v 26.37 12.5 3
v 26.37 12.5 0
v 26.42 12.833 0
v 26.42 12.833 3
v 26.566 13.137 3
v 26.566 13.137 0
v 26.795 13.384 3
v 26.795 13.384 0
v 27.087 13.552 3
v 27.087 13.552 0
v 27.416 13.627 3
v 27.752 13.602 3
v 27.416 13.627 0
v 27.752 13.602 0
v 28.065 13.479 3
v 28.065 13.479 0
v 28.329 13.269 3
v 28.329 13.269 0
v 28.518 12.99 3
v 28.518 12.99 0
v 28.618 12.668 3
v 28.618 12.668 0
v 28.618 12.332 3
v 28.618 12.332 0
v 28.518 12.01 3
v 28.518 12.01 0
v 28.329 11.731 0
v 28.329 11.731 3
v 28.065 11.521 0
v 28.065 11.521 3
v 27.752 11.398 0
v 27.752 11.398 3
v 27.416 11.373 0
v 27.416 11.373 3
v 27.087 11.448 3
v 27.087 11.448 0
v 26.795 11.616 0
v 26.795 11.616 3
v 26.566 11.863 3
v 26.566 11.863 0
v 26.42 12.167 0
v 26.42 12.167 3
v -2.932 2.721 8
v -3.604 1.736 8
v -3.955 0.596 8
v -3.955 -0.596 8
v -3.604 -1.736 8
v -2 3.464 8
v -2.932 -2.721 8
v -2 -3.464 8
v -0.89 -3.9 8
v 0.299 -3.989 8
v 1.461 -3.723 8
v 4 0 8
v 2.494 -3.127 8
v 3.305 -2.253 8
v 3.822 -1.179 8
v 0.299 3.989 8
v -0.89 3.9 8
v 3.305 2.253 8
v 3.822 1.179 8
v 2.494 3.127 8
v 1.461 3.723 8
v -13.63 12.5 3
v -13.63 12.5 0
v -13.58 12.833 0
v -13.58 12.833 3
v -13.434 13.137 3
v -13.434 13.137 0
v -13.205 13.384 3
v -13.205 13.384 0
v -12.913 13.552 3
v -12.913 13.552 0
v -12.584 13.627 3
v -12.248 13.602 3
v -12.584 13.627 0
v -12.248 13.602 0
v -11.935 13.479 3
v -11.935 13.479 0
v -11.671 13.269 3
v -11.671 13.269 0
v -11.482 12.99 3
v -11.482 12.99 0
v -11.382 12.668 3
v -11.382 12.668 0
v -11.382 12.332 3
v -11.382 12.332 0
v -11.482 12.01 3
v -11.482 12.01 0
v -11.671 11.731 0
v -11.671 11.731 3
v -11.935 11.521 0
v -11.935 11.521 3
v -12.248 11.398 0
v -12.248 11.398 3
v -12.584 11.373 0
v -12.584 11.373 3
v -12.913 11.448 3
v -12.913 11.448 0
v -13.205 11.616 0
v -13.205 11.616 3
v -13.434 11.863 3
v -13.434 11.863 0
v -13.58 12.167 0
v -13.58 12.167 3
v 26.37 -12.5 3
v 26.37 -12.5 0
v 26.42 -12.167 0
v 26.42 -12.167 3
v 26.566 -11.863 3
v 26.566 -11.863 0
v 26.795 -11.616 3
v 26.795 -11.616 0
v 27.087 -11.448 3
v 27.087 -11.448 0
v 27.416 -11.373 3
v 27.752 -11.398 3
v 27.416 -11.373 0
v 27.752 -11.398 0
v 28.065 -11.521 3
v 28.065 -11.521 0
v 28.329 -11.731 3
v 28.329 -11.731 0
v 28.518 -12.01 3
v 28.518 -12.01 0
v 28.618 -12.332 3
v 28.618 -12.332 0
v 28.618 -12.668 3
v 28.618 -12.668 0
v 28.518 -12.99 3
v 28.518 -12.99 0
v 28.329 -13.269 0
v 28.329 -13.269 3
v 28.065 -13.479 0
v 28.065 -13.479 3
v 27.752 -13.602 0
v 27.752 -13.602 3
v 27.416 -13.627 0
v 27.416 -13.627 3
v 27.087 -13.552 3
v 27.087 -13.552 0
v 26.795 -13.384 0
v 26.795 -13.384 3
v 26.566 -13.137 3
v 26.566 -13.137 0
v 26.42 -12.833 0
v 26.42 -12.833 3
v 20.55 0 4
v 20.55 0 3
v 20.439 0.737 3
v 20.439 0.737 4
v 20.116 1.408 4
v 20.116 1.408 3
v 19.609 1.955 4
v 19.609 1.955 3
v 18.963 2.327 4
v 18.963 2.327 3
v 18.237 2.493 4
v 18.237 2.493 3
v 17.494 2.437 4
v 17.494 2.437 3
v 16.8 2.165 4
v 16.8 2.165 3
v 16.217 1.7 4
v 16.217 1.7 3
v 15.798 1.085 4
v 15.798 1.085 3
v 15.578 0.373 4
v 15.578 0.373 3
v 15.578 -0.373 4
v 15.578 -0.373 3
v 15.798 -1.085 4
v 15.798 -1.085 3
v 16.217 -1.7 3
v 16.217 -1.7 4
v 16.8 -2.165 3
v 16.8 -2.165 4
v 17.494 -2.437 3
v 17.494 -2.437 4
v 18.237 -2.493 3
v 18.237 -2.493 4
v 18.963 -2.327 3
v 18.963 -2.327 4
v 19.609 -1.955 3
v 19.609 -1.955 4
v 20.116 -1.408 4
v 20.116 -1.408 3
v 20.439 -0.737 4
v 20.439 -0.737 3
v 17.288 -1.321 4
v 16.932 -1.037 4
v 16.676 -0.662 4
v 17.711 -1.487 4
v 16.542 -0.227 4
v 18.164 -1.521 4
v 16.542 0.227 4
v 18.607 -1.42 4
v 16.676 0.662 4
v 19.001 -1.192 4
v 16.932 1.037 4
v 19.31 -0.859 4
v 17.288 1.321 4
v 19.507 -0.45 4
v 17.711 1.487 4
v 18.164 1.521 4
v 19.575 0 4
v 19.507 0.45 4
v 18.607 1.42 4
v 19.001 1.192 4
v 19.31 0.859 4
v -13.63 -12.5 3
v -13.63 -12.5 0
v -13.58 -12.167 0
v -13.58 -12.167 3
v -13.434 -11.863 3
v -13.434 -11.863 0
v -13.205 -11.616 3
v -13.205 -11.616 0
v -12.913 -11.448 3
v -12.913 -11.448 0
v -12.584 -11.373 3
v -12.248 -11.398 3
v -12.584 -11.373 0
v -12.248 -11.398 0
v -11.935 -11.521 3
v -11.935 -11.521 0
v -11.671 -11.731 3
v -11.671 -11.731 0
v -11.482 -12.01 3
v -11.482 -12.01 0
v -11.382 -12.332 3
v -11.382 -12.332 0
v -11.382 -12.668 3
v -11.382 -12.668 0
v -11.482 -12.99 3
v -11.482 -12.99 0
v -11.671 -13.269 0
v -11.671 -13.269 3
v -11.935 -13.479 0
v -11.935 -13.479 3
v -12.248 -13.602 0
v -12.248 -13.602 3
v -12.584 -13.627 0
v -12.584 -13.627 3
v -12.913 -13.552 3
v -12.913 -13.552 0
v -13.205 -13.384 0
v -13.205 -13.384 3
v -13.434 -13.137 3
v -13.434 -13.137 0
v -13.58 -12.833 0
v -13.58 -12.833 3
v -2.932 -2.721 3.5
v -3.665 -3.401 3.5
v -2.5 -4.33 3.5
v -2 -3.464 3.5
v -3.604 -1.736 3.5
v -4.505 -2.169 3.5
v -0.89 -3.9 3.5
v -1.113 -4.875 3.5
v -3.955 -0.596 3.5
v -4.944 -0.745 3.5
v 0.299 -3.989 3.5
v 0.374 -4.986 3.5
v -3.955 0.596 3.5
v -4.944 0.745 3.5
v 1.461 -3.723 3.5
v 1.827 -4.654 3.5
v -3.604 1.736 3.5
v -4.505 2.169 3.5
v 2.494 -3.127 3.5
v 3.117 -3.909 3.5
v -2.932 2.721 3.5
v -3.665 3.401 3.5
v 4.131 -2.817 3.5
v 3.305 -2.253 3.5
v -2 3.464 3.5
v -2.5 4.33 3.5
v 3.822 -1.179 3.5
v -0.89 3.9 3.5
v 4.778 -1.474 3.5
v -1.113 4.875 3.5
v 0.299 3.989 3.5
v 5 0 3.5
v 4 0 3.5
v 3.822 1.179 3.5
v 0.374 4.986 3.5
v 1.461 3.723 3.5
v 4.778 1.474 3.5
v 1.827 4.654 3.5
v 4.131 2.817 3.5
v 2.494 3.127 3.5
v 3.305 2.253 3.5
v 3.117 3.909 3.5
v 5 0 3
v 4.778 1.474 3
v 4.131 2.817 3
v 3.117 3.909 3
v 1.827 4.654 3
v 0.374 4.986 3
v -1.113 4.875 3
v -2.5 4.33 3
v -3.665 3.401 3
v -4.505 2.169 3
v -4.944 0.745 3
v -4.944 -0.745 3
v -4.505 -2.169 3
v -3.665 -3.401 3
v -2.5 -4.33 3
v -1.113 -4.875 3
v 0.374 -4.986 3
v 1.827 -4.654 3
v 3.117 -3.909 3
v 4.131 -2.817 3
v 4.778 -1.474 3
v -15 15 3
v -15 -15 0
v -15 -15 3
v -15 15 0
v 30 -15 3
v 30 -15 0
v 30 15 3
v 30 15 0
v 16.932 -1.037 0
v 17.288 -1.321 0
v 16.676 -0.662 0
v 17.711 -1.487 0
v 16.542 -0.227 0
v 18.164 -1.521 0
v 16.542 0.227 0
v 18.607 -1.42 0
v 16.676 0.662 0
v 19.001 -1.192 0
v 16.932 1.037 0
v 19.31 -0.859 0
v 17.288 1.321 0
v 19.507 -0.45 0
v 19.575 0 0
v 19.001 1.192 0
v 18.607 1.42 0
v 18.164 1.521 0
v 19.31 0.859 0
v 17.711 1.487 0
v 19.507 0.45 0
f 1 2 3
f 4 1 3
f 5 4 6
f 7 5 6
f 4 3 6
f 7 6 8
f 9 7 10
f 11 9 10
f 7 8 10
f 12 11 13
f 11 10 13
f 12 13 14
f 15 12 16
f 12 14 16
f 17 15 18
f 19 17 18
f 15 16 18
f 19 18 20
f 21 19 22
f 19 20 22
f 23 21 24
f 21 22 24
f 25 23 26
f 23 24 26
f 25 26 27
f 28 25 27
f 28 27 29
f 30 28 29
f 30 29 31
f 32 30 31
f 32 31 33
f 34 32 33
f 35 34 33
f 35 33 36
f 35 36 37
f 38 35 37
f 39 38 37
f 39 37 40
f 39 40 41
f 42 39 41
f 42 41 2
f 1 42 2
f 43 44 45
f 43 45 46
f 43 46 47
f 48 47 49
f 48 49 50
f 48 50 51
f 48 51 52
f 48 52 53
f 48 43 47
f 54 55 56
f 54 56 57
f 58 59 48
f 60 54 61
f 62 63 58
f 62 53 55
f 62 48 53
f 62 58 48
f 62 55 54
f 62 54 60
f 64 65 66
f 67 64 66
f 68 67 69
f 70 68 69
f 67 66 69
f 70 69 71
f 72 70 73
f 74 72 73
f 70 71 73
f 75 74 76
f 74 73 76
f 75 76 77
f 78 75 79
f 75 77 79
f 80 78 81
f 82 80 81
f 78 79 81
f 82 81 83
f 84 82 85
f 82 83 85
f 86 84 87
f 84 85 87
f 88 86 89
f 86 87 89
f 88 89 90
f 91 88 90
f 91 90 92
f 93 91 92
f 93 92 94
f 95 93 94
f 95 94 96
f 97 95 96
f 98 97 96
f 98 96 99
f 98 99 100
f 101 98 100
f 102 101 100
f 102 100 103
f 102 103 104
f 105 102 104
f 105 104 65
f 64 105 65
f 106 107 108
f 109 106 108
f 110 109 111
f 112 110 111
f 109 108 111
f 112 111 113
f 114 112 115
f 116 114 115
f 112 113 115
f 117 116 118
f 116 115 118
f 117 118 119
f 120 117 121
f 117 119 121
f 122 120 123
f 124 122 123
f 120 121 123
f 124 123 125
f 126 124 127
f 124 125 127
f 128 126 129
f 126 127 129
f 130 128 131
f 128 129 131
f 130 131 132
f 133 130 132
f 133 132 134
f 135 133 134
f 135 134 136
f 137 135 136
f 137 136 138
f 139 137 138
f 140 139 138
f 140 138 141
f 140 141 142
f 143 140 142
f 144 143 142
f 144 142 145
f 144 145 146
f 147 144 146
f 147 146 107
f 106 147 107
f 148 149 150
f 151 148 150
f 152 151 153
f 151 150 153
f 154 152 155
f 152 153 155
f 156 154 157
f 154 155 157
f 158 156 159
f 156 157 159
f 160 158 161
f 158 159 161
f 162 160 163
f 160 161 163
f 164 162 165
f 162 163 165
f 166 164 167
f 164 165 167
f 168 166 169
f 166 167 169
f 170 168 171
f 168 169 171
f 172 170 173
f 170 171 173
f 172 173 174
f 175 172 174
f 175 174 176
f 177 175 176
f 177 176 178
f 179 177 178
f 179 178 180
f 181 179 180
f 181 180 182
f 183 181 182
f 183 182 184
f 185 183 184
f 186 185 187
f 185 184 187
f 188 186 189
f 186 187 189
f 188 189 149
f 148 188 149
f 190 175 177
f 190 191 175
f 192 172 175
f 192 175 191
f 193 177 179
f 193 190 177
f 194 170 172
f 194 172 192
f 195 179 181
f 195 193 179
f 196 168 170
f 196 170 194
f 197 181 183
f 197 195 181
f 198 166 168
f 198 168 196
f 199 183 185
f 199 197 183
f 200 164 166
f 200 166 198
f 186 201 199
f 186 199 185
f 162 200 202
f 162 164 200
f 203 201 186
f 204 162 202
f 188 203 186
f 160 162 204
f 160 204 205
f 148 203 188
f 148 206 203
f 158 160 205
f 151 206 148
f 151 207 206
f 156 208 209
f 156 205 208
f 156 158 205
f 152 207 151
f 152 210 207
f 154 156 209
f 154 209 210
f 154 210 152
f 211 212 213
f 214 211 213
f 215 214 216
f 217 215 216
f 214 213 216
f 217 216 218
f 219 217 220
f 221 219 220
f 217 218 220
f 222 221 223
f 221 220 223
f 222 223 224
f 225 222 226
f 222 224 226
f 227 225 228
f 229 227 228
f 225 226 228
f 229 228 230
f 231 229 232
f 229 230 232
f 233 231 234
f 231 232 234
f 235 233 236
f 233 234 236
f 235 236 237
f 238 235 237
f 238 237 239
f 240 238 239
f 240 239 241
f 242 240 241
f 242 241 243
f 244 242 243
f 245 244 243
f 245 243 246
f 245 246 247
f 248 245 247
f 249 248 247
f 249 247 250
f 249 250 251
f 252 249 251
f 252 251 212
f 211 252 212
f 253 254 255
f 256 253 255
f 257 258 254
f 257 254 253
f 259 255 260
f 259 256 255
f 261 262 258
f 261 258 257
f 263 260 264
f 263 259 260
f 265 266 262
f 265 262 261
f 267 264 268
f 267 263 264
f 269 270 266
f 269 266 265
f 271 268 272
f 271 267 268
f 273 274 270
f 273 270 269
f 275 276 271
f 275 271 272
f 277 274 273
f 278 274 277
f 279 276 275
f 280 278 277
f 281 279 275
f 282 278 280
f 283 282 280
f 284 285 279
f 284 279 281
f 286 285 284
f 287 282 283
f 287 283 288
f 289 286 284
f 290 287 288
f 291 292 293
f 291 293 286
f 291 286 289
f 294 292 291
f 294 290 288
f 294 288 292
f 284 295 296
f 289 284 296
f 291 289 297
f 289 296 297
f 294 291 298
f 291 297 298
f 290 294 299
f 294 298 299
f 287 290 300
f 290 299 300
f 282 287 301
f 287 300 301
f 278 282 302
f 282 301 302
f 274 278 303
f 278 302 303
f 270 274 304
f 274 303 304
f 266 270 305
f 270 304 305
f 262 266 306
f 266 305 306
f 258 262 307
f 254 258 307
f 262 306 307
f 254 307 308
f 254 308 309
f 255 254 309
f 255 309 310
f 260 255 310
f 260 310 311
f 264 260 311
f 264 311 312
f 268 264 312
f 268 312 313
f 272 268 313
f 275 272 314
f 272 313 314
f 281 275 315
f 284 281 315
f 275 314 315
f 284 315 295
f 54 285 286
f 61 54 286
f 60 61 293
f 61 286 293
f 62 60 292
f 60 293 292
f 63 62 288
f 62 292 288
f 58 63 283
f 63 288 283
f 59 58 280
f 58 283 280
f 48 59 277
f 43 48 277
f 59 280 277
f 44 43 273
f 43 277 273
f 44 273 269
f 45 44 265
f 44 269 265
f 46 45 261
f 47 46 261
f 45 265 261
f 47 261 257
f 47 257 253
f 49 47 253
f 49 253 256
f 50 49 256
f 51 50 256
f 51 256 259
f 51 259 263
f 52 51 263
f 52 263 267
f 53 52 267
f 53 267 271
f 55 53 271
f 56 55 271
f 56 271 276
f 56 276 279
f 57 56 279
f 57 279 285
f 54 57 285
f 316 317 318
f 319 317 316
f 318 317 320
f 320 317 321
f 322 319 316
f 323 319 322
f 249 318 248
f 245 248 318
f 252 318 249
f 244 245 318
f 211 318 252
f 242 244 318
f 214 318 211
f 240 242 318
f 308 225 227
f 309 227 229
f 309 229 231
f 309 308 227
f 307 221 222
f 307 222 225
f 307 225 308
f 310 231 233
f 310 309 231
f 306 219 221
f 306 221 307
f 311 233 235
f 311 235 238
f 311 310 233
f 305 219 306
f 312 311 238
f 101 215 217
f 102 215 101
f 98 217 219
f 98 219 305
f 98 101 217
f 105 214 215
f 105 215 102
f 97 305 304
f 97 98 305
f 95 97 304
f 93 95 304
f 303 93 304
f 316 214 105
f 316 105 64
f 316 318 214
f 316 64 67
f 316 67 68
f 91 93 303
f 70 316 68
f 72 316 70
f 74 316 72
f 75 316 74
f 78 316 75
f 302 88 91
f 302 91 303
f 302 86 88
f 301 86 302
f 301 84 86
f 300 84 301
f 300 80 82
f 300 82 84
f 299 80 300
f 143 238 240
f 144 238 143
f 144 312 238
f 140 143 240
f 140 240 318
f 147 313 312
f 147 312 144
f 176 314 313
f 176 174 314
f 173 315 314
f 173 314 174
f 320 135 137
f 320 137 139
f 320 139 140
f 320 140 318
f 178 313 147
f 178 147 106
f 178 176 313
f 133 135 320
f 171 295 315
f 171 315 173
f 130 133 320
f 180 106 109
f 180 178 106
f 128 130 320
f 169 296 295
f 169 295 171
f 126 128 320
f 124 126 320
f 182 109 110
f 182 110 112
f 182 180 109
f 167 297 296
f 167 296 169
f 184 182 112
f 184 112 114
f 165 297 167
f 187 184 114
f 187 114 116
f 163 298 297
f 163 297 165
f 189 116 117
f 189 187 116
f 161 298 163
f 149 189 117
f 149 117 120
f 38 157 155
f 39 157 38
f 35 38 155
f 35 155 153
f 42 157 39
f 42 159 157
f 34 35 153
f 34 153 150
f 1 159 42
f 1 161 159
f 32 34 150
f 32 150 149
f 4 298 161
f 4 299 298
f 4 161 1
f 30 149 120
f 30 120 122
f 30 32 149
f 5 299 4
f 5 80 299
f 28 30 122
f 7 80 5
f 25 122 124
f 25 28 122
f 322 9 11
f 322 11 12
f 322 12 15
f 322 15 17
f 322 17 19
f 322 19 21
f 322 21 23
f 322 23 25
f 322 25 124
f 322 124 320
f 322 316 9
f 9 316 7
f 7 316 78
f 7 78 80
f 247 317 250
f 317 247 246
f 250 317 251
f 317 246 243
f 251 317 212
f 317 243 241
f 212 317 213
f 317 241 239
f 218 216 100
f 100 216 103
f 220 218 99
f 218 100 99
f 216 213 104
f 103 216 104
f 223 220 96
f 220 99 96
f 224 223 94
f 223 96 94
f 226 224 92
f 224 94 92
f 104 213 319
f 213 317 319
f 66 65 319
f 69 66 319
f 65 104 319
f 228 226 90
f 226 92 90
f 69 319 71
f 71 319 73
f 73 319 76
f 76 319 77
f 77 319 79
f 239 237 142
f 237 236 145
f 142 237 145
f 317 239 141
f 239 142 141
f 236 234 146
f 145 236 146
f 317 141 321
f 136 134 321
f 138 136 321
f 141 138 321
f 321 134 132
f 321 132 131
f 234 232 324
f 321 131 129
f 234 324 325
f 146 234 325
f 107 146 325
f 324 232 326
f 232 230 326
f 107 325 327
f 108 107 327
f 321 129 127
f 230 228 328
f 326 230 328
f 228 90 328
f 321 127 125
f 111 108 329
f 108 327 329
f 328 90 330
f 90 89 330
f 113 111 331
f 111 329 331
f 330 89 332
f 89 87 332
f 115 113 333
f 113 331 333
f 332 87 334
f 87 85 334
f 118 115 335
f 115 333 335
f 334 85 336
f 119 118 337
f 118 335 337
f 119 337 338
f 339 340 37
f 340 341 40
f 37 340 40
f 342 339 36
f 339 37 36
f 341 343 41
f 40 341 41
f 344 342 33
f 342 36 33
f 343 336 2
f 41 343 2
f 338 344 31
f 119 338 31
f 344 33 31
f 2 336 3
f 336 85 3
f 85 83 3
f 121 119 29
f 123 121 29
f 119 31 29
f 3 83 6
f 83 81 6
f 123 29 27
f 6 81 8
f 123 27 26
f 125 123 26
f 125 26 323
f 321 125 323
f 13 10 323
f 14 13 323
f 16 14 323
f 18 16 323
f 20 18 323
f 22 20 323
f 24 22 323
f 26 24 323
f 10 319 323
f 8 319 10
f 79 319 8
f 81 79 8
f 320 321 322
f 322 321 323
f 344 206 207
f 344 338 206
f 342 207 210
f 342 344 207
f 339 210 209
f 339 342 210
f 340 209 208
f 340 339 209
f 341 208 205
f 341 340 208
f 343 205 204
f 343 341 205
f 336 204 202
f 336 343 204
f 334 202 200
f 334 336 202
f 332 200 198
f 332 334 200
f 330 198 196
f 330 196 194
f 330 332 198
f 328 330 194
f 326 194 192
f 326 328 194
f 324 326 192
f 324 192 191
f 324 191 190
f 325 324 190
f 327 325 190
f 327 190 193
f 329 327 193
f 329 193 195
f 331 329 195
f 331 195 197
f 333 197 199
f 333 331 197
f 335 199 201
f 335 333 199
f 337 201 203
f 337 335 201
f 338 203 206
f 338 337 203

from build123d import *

# Parameters (mm, degrees)
SKETCH1_W             = 45
SKETCH1_H             = 30
SKETCH1_R             = 1.525
BOSS_EXTRUDE1_DEPTH   = 3
SKETCH2_R             = 4
BOSS_EXTRUDE2_DEPTH   = 5
SKETCH3_R             = 5
BOSS_EXTRUDE3_DEPTH   = 0.5
F_2_CLEARANCE_HOLE1_D = 2.2606
SKETCH6_R             = 2.5
SKETCH6_R_2           = 1.525
BOSS_EXTRUDE4_DEPTH   = 1


with BuildPart() as part:
    # Sketch1 → Boss-Extrude1 (new body)
    with BuildSketch(Plane.XY):
        with Locations((7.5, 0)):
            Rectangle(SKETCH1_W, SKETCH1_H)
        with Locations((18.050000068, 0)):
            Circle(SKETCH1_R, mode=Mode.SUBTRACT)
    extrude(amount=BOSS_EXTRUDE1_DEPTH)

    # Sketch2 → Boss-Extrude2 (add)
    with BuildSketch(Plane.XY.offset(3)):
        Circle(SKETCH2_R)
    extrude(amount=BOSS_EXTRUDE2_DEPTH)

    # Sketch3 → Boss-Extrude3 (add)
    with BuildSketch(Plane.XY.offset(3)):
        Circle(SKETCH3_R)
    extrude(amount=BOSS_EXTRUDE3_DEPTH)

    # #2 Clearance Hole1 (through all)
    with Locations(Plane.XY.offset(3)):
        with Locations((-12.5, 12.5), (-12.5, -12.5), (27.5, -12.5), (27.5, 12.5)):
            Hole(F_2_CLEARANCE_HOLE1_D / 2)

    # Sketch6 → Boss-Extrude4 (add)
    with BuildSketch(Plane.XY.offset(3)):
        with Locations((18.050000068, 0)):
            Circle(SKETCH6_R)
        with Locations((18.050000068, 0)):
            Circle(SKETCH6_R_2, mode=Mode.SUBTRACT)
    extrude(amount=BOSS_EXTRUDE4_DEPTH)


solid = part.part
